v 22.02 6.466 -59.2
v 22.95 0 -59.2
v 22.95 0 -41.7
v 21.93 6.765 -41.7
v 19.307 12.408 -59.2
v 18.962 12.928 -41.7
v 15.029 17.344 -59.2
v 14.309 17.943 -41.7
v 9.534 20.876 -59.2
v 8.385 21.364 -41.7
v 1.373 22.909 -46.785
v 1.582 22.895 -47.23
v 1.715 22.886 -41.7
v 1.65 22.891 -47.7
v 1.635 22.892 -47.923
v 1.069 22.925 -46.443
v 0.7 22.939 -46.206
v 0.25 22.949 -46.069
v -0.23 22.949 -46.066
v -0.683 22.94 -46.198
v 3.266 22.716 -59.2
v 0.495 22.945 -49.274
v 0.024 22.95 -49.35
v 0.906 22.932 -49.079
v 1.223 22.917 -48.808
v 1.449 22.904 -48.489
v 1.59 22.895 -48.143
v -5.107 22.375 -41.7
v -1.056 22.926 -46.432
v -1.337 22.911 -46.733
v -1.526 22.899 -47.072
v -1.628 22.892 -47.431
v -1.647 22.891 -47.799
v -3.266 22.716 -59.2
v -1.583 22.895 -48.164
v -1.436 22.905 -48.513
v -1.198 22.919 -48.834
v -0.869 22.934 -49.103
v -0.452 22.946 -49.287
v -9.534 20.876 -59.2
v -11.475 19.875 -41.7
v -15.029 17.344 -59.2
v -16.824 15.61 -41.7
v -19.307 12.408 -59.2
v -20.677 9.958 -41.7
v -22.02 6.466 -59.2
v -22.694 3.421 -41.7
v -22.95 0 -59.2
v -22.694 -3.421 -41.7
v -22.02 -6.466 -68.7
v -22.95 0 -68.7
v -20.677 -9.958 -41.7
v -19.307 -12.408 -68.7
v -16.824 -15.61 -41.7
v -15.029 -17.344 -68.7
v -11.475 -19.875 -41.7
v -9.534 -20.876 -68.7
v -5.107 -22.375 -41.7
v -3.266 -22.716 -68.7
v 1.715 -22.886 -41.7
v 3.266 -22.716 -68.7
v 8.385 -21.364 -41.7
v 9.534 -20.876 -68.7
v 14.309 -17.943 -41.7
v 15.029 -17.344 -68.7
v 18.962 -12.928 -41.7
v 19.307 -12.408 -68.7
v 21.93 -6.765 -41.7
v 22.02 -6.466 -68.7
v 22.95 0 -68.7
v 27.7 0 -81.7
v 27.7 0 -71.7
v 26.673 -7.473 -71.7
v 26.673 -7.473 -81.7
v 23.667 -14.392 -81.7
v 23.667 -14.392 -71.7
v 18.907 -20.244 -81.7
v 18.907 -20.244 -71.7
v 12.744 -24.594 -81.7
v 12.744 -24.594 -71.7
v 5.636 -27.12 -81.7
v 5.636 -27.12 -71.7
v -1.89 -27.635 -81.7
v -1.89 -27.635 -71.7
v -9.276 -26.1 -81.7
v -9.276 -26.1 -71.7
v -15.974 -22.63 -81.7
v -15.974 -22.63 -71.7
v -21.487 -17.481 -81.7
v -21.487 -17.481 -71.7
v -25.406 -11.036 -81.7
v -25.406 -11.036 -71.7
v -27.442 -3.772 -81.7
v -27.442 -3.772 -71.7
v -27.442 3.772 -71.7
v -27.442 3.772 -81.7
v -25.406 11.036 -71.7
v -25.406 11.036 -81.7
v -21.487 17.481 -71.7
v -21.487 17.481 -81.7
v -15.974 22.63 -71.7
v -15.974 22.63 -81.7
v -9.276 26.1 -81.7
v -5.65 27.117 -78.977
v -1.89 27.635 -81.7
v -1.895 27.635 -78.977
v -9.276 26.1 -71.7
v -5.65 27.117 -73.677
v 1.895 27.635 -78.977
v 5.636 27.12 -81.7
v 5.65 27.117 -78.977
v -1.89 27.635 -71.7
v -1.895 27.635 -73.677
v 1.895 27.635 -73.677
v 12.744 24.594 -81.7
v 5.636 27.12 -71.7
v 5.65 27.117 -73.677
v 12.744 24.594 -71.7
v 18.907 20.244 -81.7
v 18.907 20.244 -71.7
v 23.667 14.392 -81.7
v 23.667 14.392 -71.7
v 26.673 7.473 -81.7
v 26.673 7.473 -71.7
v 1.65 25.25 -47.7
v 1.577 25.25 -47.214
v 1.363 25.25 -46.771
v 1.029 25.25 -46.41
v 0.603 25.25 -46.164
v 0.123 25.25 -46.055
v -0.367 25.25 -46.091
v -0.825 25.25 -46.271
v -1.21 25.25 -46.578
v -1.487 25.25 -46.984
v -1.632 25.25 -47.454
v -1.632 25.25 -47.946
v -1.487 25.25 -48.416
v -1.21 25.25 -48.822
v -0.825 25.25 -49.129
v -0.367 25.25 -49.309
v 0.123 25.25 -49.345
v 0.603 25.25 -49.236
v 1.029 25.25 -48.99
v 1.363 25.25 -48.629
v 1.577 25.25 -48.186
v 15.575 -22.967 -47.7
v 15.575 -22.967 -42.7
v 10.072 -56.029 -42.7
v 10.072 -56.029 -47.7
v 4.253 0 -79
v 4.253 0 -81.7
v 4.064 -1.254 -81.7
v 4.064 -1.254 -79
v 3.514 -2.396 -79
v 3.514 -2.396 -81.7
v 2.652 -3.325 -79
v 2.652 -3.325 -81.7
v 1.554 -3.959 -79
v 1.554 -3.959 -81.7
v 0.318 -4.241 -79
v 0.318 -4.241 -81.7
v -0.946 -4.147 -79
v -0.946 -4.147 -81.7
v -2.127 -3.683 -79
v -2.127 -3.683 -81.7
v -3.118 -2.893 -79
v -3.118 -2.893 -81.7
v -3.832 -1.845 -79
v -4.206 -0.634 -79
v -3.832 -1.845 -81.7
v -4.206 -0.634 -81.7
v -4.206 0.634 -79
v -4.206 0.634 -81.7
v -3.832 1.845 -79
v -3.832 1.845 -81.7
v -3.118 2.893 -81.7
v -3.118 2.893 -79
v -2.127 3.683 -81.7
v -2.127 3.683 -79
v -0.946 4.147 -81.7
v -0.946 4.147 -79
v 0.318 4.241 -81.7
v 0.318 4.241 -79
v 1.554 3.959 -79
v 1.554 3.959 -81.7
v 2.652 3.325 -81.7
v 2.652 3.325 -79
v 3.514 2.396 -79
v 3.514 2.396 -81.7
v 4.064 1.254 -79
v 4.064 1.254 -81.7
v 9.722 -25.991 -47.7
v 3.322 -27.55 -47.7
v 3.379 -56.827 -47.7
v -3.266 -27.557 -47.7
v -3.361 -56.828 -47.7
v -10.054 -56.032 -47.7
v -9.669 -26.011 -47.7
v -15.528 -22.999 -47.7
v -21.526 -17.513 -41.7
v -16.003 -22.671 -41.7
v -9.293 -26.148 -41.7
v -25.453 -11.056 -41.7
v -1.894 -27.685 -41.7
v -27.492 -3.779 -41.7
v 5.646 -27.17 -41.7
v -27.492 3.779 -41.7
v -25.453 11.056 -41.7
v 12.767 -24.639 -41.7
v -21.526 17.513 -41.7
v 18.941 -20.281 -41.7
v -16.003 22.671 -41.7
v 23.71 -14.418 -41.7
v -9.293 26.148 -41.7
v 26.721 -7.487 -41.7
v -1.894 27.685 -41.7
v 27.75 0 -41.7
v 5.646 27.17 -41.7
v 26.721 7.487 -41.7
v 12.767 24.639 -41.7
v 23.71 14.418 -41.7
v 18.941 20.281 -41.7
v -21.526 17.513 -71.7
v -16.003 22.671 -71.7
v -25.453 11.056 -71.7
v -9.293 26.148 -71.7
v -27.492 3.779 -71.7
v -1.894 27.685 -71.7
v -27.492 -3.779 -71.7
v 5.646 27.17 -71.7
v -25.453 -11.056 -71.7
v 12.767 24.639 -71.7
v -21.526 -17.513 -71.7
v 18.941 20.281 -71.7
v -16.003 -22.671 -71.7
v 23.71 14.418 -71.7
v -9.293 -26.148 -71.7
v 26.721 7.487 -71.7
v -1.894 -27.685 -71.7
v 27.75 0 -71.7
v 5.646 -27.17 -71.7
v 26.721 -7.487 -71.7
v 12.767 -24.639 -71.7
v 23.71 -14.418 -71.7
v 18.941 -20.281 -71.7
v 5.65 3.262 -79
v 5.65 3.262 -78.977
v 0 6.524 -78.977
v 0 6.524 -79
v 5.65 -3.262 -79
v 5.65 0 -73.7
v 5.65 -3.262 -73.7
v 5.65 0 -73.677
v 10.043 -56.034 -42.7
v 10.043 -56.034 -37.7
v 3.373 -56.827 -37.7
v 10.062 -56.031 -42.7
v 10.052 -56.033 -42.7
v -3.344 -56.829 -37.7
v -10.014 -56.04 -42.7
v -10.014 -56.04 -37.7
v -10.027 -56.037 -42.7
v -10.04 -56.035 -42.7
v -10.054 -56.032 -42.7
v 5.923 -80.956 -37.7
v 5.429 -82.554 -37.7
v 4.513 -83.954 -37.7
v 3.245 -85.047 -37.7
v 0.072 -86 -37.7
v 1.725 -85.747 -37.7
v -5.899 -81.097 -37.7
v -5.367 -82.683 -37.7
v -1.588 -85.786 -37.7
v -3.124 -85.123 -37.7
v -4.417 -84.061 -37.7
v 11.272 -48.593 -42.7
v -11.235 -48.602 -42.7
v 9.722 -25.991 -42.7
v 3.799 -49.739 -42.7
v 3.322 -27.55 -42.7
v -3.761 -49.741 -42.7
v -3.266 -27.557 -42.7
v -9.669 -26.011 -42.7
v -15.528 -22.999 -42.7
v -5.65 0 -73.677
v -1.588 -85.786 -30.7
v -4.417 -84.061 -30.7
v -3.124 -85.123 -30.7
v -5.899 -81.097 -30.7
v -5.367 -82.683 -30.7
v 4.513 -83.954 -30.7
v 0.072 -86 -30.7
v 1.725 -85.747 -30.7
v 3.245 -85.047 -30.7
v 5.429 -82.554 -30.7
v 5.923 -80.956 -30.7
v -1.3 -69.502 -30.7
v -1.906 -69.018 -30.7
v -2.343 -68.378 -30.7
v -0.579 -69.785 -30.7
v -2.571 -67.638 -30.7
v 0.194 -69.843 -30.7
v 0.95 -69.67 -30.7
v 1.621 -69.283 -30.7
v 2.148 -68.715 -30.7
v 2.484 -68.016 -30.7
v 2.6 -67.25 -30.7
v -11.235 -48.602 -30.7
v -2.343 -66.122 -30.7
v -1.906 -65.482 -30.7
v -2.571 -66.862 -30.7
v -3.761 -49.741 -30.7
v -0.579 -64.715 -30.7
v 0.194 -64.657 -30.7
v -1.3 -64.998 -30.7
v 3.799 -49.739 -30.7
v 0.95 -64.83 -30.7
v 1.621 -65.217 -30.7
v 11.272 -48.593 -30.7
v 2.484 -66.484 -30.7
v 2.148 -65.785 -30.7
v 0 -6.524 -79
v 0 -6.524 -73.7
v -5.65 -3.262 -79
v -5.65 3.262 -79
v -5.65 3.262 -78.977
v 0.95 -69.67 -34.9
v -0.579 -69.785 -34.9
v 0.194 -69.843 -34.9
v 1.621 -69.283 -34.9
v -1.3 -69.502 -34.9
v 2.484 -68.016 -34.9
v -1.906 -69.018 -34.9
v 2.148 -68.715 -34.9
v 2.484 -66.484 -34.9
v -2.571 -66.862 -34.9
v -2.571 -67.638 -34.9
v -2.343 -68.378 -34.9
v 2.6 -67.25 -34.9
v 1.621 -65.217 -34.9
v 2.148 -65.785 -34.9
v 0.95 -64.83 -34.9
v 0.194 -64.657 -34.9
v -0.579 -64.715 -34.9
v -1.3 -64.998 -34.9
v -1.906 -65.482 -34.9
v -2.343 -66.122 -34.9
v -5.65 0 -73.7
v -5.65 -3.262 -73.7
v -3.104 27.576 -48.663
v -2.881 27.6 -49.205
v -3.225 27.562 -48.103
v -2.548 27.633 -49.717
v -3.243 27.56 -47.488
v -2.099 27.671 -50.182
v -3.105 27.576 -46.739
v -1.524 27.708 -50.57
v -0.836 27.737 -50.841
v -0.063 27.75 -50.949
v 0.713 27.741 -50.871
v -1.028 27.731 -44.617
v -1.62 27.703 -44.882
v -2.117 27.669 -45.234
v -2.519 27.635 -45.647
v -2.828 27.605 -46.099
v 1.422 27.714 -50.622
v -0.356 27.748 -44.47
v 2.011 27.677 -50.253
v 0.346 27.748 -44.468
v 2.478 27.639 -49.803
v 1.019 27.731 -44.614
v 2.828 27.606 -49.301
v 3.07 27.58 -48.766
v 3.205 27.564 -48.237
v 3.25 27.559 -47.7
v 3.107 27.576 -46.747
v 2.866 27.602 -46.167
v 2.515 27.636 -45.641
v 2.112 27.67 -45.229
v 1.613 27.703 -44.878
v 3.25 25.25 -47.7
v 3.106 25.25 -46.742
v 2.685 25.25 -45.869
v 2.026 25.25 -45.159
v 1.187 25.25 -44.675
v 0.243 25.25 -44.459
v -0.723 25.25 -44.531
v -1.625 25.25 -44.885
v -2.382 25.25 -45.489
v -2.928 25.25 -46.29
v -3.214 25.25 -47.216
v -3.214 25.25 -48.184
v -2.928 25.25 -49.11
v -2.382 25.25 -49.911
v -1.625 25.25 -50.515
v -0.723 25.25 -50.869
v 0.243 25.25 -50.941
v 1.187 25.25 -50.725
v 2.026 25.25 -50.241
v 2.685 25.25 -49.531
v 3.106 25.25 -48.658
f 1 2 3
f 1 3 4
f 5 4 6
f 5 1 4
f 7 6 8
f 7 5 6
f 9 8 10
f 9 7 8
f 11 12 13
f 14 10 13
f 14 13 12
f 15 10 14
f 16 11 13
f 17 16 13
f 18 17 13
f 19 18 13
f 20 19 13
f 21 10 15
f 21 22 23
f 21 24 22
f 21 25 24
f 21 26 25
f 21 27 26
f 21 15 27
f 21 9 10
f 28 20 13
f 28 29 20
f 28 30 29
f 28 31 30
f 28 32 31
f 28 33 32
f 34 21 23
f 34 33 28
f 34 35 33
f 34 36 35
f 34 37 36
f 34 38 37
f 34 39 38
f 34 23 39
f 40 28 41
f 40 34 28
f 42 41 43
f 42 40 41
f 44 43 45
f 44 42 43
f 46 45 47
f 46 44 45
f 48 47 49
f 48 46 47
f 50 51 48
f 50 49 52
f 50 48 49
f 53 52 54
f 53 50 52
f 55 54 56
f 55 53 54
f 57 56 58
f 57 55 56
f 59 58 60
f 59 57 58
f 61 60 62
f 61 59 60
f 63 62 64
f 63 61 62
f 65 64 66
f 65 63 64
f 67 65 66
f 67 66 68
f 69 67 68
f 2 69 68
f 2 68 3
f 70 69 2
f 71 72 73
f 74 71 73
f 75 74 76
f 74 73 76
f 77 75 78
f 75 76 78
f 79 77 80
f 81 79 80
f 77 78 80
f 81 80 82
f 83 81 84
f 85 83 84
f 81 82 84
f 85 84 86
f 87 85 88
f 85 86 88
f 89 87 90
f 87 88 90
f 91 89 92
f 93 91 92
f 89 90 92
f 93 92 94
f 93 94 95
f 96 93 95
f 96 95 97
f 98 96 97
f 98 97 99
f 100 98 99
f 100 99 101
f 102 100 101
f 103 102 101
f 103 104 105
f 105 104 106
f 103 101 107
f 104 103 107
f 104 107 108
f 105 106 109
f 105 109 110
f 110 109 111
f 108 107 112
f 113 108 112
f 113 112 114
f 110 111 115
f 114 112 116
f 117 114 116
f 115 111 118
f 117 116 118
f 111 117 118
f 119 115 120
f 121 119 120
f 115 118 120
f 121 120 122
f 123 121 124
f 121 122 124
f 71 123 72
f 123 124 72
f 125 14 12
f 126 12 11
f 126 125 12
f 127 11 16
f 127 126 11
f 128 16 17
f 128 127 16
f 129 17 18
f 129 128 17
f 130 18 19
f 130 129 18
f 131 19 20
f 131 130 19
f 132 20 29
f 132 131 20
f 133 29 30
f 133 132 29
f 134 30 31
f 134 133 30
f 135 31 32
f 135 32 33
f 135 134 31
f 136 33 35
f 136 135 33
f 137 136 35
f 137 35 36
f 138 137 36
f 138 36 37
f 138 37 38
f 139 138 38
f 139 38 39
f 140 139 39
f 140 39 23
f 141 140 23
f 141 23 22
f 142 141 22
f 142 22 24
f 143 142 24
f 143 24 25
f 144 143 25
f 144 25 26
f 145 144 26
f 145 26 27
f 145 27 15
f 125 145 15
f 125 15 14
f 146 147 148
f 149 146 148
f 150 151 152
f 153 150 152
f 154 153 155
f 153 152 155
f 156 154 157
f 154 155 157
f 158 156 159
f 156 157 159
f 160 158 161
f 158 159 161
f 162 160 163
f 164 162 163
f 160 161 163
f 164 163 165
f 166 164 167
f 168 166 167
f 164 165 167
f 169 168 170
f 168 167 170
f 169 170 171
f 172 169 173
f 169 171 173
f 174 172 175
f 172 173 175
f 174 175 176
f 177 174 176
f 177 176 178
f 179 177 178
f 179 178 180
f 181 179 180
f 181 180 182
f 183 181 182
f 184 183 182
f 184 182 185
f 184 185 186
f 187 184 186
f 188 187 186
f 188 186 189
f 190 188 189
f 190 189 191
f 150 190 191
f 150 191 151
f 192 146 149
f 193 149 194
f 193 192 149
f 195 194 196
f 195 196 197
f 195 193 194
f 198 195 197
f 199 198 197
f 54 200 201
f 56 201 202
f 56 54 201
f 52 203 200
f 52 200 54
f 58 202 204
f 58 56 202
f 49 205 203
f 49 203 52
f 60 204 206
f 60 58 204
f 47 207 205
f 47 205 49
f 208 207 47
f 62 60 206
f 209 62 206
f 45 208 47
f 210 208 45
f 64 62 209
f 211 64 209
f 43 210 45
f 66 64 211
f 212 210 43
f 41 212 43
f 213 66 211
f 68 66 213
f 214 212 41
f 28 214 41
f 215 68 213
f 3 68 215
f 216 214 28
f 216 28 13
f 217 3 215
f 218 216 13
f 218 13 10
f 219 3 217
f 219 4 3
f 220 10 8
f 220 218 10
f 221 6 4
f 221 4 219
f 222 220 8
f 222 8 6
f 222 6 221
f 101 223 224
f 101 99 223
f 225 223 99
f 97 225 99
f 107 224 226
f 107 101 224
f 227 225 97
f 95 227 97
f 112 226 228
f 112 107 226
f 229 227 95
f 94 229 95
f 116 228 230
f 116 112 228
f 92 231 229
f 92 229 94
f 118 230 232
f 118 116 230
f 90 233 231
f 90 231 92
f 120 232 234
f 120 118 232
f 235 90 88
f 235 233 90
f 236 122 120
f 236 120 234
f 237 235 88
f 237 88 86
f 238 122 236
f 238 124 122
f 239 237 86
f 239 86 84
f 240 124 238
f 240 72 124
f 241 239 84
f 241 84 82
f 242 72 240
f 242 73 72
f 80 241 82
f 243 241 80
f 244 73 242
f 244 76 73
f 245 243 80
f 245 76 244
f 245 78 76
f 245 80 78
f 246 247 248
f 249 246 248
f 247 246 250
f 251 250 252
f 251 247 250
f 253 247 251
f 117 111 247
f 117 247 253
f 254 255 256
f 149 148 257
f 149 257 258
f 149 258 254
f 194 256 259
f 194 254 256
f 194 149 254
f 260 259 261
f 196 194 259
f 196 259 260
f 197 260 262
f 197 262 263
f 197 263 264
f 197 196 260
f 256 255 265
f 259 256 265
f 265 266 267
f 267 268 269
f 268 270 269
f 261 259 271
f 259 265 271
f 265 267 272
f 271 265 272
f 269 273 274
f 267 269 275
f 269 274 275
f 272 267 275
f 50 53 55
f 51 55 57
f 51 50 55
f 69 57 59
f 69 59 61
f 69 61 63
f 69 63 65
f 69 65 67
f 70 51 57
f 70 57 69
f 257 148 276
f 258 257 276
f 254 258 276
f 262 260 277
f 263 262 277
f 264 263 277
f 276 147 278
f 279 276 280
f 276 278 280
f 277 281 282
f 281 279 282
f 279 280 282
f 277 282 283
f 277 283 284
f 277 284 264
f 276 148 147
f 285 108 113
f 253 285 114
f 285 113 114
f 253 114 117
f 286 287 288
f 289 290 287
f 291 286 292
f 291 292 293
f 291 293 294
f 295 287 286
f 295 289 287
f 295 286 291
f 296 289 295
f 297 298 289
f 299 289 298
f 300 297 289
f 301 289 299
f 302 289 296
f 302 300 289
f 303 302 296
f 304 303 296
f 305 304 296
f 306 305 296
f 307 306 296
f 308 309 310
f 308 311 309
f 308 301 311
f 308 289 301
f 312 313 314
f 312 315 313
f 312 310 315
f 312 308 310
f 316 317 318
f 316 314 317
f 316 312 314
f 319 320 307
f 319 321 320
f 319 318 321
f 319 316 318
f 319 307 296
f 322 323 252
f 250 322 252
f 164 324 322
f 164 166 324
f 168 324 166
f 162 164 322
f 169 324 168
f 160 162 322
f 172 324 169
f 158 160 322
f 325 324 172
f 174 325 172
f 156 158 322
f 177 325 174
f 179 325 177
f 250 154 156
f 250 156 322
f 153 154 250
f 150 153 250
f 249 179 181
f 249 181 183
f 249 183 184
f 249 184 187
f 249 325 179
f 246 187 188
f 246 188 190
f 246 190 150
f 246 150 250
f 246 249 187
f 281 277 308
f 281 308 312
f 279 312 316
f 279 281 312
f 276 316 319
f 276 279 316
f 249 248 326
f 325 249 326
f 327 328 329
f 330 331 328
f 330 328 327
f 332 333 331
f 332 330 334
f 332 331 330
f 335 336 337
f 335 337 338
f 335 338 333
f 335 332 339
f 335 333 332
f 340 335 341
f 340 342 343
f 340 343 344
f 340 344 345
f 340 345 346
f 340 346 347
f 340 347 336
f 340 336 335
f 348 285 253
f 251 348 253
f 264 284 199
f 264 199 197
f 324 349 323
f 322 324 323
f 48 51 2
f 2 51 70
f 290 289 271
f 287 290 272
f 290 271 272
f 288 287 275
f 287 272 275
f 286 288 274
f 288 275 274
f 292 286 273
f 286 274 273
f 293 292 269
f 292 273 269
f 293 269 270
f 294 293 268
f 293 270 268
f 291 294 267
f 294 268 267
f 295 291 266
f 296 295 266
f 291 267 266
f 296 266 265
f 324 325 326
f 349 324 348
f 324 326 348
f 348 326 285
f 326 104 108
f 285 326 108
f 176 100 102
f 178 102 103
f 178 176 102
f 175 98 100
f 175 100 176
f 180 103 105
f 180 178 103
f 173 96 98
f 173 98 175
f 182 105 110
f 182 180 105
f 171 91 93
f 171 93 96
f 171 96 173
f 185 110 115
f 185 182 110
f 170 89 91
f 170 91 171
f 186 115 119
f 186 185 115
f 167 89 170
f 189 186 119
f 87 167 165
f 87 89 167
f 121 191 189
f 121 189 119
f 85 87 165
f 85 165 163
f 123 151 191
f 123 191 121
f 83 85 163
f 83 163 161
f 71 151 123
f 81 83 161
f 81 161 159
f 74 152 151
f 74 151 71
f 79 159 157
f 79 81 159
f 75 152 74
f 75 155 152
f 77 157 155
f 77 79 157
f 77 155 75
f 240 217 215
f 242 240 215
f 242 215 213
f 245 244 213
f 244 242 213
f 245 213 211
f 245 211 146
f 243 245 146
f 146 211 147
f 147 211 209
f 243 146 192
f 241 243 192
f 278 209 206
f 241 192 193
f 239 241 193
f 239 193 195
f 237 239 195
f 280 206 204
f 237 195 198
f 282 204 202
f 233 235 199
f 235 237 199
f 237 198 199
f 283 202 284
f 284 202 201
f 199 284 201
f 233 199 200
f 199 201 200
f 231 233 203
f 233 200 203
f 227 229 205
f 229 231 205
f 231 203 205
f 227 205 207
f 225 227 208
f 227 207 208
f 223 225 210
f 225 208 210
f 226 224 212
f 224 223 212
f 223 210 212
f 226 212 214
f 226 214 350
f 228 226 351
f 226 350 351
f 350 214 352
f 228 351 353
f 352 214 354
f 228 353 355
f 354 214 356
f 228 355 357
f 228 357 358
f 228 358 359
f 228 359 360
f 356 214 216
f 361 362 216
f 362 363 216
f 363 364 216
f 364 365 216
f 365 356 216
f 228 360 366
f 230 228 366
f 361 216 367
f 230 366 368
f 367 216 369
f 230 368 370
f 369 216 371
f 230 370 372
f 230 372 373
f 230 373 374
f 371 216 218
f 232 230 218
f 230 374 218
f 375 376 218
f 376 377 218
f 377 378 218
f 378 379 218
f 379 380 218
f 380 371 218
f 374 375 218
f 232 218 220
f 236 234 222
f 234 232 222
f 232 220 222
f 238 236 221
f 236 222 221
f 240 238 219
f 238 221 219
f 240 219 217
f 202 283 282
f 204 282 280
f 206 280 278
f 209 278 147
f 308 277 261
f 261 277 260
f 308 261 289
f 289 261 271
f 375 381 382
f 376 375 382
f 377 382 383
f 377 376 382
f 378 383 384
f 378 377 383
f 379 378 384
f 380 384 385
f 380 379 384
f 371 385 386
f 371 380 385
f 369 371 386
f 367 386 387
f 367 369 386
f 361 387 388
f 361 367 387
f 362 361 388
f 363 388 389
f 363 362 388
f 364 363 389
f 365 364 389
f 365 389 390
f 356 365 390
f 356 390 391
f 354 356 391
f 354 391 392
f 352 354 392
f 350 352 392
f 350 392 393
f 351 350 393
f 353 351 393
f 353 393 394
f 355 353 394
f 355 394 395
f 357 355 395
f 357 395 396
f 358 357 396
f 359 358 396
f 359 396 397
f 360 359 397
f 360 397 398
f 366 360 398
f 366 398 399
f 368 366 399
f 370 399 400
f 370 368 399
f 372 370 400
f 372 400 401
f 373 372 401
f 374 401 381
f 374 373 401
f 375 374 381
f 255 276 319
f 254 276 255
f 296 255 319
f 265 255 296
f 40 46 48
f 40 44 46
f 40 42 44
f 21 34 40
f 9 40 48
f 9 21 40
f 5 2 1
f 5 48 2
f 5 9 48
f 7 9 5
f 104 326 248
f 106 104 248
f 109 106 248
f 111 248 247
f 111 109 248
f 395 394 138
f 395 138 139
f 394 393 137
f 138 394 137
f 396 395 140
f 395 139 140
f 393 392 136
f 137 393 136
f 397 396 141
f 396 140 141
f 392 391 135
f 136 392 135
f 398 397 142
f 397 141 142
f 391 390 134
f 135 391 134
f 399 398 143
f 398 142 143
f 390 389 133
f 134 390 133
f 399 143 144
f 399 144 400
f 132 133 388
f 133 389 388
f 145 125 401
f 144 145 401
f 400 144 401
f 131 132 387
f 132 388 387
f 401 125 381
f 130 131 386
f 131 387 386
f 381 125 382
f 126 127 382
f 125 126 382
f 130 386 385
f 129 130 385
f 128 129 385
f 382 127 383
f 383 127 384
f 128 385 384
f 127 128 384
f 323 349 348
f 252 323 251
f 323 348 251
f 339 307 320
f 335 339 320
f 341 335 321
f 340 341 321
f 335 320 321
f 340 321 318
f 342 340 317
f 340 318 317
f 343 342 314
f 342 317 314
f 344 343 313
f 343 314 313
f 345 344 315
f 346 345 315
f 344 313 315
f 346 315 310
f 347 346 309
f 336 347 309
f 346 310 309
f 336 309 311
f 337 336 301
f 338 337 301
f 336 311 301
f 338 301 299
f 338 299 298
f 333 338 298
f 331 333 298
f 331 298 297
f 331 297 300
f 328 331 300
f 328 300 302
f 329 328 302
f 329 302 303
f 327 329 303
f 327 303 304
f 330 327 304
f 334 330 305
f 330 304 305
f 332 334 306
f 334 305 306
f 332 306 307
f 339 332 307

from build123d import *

# Parameters (mm, degrees)
CYLINDER016_R     = 1.65
CYLINDER016_DEPTH = 50
CYLINDER017_R     = 3.25
CYLINDER017_DEPTH = 2.5
BOX005_W          = 80
BOX005_H          = 100
BOX005_DEPTH      = 9.5
CYLINDER014_R     = 22.95
CYLINDER014_DEPTH = 27
CYLINDER015_R     = 27.75
CYLINDER015_DEPTH = 40
SKETCH013_R       = 27.75
PAD001_DEPTH      = 10
SKETCH014_W       = 24
SKETCH014_H       = 14.2
POCKET013_DEPTH   = 28
SKETCH015_R       = 8.1
POCKET014_DEPTH   = 15
POCKET015_DEPTH   = 14.4
PAD003_DEPTH      = 5
PAD004_DEPTH      = 12
POCKET017_DEPTH   = 10
SKETCH033_R       = 2.6
POCKET029_DEPTH   = 4.2
SKETCH034_W       = 108.293205
SKETCH034_H       = 87.132465
POCKET030_DEPTH   = 20
SKETCH035_R       = 27.699707
PAD005_DEPTH      = 10
SKETCH036_W       = 11.3
SKETCH036_H       = 5.3
POCKET031_DEPTH   = 33
POCKET032_DEPTH   = 5.3
SKETCH038_R       = 4.253317
POCKET033_DEPTH   = 8


with BuildPart() as cylinder016:
    # Cylinder016 → Cylinder016 (new body)
    with BuildSketch(Plane(origin=(0, 50, 20), x_dir=(1, 0, 0), z_dir=(0, -1, 0))):
        Circle(CYLINDER016_R)
    extrude(amount=CYLINDER016_DEPTH)


with BuildPart() as cylinder017:
    # Cylinder017 → Cylinder017 (new body)
    with BuildSketch(Plane(origin=(0, 27.75, 20), x_dir=(1, 0, 0), z_dir=(0, -1, 0))):
        Circle(CYLINDER017_R)
    extrude(amount=CYLINDER017_DEPTH)


with BuildPart() as addcube001:
    # Box005 → Box005 (new body)
    with BuildSketch(Plane(origin=(-40, 0, -1), x_dir=(1, 0, 0), z_dir=(0, 0, 1))):
        with Locations((40, 50)):
            Rectangle(BOX005_W, BOX005_H)
    extrude(amount=BOX005_DEPTH)


with BuildPart() as fusion007:
    # Cylinder014 → Cylinder014 (new body)
    with BuildSketch(Plane.XY.offset(-1)):
        Circle(CYLINDER014_R)
    extrude(amount=CYLINDER014_DEPTH)

    # Cut011: cut AddCube001
    add(addcube001.part, mode=Mode.SUBTRACT)

    # Fusion007: union Cylinder016, Cylinder017
    add(cylinder016.part)
    add(cylinder017.part)


with BuildPart() as mounttotripod:
    # Cylinder015 → Cylinder015 (new body)
    with BuildSketch(Plane.XY.offset(-14)):
        Circle(CYLINDER015_R)
    extrude(amount=CYLINDER015_DEPTH)

    # Cut010: cut Fusion007
    add(fusion007.part, mode=Mode.SUBTRACT)

    # Sketch013 (on Face2 of BaseFeature003) → Pad001 (new body)
    with BuildSketch(Plane(origin=(0, 0, -14), x_dir=(1, 0, 0), z_dir=(0, 0, -1))):
        Circle(SKETCH013_R)
    extrude(amount=PAD001_DEPTH)

    # Sketch014 → Pocket013 (cut)
    with BuildSketch(Plane(origin=(0, 28, 0), x_dir=(-1, 0, 0), z_dir=(0, 1, 0))):
        with Locations((0, -12.1)):
            Rectangle(SKETCH014_W, SKETCH014_H)
    extrude(amount=-POCKET013_DEPTH, mode=Mode.SUBTRACT)

    # Sketch015 (on Face6 of Pocket013) → Pocket014 (cut)
    with BuildSketch(Plane(origin=(0, 0, -24), x_dir=(1, 0, 0), z_dir=(0, 0, -1))):
        Circle(SKETCH015_R)
    extrude(amount=-POCKET014_DEPTH, mode=Mode.SUBTRACT)

    # Sketch016 (on Face6 of Pocket014) → Pocket015 (cut)
    with BuildSketch(Plane(origin=(0, 0, -19.3), x_dir=(1, 0, 0), z_dir=(0, 0, -1))):
        Polygon((0, -14.036056), (12.155581, -7.018028), (12.155581, 7.018028), (0, 14.036056), (-12.155581, 7.018028), (-12.155581, -7.018028), align=None)
    extrude(amount=-POCKET015_DEPTH, mode=Mode.SUBTRACT)

    # Sketch019 (on Face8 of Pocket015) → Pad003 (join)
    with BuildSketch(Plane.XY.offset(25)):
        with BuildLine():
            ThreePointArc((-15.553331, -22.846971), (0.028426, -27.638548), (15.600294, -22.814929))
            Line((15.600294, -22.814929), (5.918583, -80.985076))
            ThreePointArc((-5.919268, -80.980951), (-0.002091, -86), (5.918583, -80.985076))
            Line((-15.553331, -22.846971), (-5.919268, -80.980951))
        make_face()
    extrude(amount=-PAD003_DEPTH)

    # Sketch031 (on Face12 of Pad003) → Pad004 (join)
    with BuildSketch(Plane.XY.offset(25)):
        with BuildLine():
            ThreePointArc((-5.898869, -81.096969), (0.071542, -85.999573), (5.92335, -80.955994))
            Line((11.272496, -48.593121), (5.92335, -80.955994))
            ThreePointArc((-11.235042, -48.601794), (0.019223, -49.883466), (11.272496, -48.593121))
            Line((-11.235042, -48.601794), (-5.898869, -81.096969))
        make_face()
    extrude(amount=PAD004_DEPTH)

    # Sketch032 (on Face10 of Pad004) → Pocket017 (cut)
    with BuildSketch(Plane(origin=(0, 0, 20), x_dir=(1, 0, 0), z_dir=(0, 0, -1))):
        with BuildLine():
            ThreePointArc((17.426701, 54.194258), (-0.181494, 56.926923), (-17.771906, 54.082038))
            Line((-17.771906, 54.082038), (-17.771906, 91.276634))
            Line((17.426701, 91.276634), (-17.771906, 91.276634))
            Line((17.426701, 54.194258), (17.426701, 91.276634))
        make_face()
    extrude(amount=-POCKET017_DEPTH, mode=Mode.SUBTRACT)

    # Sketch033 (on Face33 of Pocket017) → Pocket029 (cut)
    with BuildSketch(Plane.XY.offset(37)):
        with Locations((0, -67.25)):
            Circle(SKETCH033_R)
    extrude(amount=-POCKET029_DEPTH, mode=Mode.SUBTRACT)

    # Sketch034 (on Face6 of Pocket029) → Pocket030 (cut)
    with BuildSketch(Plane(origin=(0, 0, -24), x_dir=(1, 0, 0), z_dir=(0, 0, -1))):
        with Locations((-3.019794, 5.274049)):
            Rectangle(SKETCH034_W, SKETCH034_H)
    extrude(amount=-POCKET030_DEPTH, mode=Mode.SUBTRACT)

    # Sketch035 (on Face2 of Pocket030) → Pad005 (join)
    with BuildSketch(Plane(origin=(0, 0, -4), x_dir=(1, 0, 0), z_dir=(0, 0, -1))):
        Circle(SKETCH035_R)
    extrude(amount=PAD005_DEPTH)

    # Sketch036 → Pocket031 (cut)
    with BuildSketch(Plane.XZ.offset(-33)):
        with Locations((0, -8.627069)):
            Rectangle(SKETCH036_W, SKETCH036_H)
    extrude(amount=POCKET031_DEPTH, mode=Mode.SUBTRACT)

    # Sketch037 → Pocket032 (cut)
    with BuildSketch(Plane.XY.offset(-6)):
        Polygon((5.65, -3.262029), (5.65, 3.262029), (0, 6.524058), (-5.65, 3.262029), (-5.65, -3.262029), (0, -6.524058), align=None)
    extrude(amount=-POCKET032_DEPTH, mode=Mode.SUBTRACT)

    # Sketch038 (on Face16 of Pocket032) → Pocket033 (cut)
    with BuildSketch(Plane(origin=(0, 0, -14), x_dir=(1, 0, 0), z_dir=(0, 0, -1))):
        Circle(SKETCH038_R)
    extrude(amount=-POCKET033_DEPTH, mode=Mode.SUBTRACT)


with BuildPart() as mounttotripod_1:
    # Body003 placement: moved
    add(mounttotripod.part.moved(Location((0, 0, -67.7))))


solid = mounttotripod_1.part
